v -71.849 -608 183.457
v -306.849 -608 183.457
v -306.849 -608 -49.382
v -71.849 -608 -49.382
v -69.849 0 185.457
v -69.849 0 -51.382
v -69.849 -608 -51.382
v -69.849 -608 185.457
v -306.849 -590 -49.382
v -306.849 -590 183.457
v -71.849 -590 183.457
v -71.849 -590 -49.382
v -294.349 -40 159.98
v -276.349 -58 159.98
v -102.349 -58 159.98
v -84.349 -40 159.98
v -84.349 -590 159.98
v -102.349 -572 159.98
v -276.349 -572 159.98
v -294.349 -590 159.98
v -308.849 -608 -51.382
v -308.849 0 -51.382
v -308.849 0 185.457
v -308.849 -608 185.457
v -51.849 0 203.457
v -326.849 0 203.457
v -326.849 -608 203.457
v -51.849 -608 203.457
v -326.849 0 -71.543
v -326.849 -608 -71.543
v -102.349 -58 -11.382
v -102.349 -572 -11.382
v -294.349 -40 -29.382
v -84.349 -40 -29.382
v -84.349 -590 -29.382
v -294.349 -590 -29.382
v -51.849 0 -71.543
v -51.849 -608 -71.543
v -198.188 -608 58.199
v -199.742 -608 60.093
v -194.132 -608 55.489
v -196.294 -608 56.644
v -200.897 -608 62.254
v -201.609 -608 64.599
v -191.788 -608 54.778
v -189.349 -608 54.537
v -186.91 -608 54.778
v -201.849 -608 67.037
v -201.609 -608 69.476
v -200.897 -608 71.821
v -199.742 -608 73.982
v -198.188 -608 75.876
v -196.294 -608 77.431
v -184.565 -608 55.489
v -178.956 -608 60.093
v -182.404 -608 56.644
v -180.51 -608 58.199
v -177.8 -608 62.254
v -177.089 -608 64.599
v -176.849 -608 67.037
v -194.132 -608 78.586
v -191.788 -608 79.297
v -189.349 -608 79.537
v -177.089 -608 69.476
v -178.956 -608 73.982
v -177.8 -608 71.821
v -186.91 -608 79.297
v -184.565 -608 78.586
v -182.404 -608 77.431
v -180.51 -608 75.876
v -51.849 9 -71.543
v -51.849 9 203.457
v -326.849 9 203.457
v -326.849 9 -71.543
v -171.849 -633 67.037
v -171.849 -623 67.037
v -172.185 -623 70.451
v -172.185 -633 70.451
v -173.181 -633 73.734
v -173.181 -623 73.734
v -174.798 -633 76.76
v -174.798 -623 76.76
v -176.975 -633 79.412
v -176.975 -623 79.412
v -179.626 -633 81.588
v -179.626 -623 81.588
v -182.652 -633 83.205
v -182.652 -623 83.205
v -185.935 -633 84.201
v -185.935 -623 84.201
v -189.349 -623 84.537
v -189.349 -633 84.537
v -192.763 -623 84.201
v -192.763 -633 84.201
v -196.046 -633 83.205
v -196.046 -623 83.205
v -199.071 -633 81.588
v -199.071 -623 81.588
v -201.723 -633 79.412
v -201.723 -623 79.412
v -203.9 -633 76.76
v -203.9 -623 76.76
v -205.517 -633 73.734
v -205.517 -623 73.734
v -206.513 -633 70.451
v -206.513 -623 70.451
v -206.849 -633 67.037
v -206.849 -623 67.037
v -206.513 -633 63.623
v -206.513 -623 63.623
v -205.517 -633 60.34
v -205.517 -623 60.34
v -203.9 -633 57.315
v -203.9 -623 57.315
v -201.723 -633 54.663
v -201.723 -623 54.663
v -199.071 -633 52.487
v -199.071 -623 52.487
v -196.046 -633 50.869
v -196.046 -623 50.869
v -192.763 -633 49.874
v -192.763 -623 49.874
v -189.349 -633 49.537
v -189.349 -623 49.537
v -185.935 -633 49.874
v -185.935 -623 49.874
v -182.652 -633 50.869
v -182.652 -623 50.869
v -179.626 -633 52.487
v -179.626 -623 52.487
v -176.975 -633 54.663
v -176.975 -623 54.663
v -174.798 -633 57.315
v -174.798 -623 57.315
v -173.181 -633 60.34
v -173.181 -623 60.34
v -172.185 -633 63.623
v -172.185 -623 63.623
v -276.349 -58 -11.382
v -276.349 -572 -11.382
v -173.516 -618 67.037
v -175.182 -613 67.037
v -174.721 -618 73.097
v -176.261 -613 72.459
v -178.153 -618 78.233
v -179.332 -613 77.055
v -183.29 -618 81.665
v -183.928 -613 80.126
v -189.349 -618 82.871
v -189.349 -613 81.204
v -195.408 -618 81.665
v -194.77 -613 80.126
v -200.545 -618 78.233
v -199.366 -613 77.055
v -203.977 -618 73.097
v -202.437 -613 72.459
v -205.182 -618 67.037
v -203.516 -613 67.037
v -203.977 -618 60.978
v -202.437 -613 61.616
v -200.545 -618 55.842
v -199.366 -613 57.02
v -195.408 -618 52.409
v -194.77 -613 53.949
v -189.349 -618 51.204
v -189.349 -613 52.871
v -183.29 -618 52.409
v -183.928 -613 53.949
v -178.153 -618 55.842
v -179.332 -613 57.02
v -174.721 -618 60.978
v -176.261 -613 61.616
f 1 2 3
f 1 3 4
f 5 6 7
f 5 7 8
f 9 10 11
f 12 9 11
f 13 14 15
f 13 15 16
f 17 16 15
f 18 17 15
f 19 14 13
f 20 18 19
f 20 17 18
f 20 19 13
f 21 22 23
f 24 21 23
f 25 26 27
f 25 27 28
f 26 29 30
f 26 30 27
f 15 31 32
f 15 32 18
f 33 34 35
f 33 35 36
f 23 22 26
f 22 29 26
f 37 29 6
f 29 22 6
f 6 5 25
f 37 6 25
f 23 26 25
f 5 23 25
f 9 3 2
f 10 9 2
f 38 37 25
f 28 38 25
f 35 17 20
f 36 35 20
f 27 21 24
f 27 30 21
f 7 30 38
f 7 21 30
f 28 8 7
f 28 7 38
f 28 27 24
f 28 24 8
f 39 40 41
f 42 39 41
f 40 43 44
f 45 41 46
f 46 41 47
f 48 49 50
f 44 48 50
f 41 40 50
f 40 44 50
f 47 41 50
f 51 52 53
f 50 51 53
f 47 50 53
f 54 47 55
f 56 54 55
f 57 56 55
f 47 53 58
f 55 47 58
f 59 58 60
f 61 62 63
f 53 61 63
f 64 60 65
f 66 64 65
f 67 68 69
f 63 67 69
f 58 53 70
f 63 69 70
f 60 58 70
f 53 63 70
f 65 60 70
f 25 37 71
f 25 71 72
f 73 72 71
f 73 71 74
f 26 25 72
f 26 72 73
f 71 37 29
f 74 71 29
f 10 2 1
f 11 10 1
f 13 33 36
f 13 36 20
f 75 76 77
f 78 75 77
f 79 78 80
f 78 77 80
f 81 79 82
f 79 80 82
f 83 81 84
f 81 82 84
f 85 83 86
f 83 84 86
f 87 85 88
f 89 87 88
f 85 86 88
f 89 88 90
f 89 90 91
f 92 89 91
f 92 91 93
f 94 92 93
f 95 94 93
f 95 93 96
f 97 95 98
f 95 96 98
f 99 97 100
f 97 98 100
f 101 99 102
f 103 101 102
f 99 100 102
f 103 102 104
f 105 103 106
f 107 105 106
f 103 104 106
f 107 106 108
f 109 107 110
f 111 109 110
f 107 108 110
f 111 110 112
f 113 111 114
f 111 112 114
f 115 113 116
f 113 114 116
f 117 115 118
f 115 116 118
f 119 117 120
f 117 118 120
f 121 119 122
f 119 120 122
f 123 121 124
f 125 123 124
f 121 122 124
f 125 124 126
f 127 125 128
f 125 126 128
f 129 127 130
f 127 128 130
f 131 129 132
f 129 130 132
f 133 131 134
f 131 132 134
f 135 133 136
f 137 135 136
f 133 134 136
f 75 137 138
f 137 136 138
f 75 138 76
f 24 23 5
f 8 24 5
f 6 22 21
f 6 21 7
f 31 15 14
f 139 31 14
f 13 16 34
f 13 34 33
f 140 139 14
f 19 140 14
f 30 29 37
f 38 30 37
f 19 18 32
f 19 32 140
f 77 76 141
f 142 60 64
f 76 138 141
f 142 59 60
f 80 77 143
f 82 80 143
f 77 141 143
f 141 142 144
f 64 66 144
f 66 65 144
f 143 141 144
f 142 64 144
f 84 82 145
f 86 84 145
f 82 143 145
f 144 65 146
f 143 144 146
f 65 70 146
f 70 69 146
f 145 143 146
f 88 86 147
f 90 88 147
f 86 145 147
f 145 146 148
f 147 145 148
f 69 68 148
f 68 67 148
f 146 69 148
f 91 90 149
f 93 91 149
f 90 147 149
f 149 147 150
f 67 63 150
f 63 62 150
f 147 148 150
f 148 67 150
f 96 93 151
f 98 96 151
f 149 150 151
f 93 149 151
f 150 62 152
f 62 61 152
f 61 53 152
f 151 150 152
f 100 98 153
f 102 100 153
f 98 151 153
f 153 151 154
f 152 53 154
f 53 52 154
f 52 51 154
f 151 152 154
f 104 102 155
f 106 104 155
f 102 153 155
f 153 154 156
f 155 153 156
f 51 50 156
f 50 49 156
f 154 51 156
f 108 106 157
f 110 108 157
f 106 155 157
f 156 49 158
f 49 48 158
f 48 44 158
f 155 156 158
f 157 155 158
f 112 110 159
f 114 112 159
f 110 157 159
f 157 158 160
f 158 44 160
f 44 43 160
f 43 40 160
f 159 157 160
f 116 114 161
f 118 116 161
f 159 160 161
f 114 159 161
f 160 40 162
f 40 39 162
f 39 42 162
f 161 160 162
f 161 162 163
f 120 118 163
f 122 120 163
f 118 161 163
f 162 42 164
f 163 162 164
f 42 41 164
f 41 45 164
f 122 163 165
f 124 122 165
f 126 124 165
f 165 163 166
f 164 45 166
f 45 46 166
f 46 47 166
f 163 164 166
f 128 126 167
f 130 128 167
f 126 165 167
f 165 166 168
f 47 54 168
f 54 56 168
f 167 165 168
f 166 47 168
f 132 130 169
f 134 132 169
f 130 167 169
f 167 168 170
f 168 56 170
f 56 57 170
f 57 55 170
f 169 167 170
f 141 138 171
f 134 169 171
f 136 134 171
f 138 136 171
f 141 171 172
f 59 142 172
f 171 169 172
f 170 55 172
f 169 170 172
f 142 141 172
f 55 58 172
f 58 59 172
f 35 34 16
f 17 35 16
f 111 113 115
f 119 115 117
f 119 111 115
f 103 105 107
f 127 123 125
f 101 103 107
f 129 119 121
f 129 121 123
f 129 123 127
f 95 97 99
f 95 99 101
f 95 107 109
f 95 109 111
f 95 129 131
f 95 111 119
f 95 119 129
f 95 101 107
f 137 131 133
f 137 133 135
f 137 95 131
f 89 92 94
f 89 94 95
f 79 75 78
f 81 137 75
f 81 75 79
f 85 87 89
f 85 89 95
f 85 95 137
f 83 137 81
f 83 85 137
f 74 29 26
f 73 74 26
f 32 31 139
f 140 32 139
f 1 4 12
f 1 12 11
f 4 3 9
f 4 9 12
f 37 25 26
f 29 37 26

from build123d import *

# Parameters (mm, degrees)
F0_W      = 275
F0_H      = 275
F0_W_2    = 239
F0_H_2    = 236.838547
F1_DEPTH  = 608
F2_W      = 275
F2_H      = 275
F3_DEPTH  = 9
F4_W      = 235
F4_H      = 232.838547
F5_DEPTH  = 18
F6_W      = 210
F6_H      = 189.362255
F7_DEPTH  = 550
F8_T      = -18
F9_R      = 17.5
F10_DEPTH = 25
F11_SIZE2 = 5
F11_SIZE  = 15


with BuildPart() as f1:
    # F0 (on Front) → F1 (new body)
    with BuildSketch(Plane.XZ):
        with Locations((-189.348952, 65.956648)):
            Rectangle(F0_W, F0_H)
        with Locations((-189.348952, 67.037374)):
            Rectangle(F0_W_2, F0_H_2, mode=Mode.SUBTRACT)
    extrude(amount=F1_DEPTH)


with BuildPart() as f3:
    # F2 (on face) → F3 (new body)
    with BuildSketch(Plane(origin=(0, 0, 0), x_dir=(-1, 0, 0), z_dir=(0, 1, 0))):
        with Locations((189.348952, 65.956648)):
            Rectangle(F2_W, F2_H)
    extrude(amount=F3_DEPTH)


with BuildPart() as f5:
    # F4 (on face) → F5 (new body)
    with BuildSketch(Plane.XZ.offset(608)):
        with Locations((-189.348952, 67.037374)):
            Rectangle(F4_W, F4_H)
    extrude(amount=-F5_DEPTH)


with BuildPart() as f7:
    # F6 (on face) → F7 (new body)
    with BuildSketch(Plane(origin=(0, -590, 0), x_dir=(-1, 0, 0), z_dir=(0, 1, 0))):
        with Locations((189.348952, 65.299228)):
            Rectangle(F6_W, F6_H)
    extrude(amount=F7_DEPTH)

    # F8
    f8_openings = [f7.faces().sort_by_distance(p)[0] for p in [
        (-189.348952, -315, 159.980356),
    ]]
    offset(amount=F8_T, openings=f8_openings)


with BuildPart() as f10:
    # F9 (on face) → F10 (new body)
    with BuildSketch(Plane.XZ.offset(608)):
        with Locations((-189.348952, 67.037374)):
            Circle(F9_R)
    extrude(amount=F10_DEPTH)

    # F11
    f11_edges = [f10.edges().sort_by_distance(p)[0] for p in [
        (-206.848952, -608, 67.037374),
    ]]
    chamfer(f11_edges, length=F11_SIZE, length2=F11_SIZE2)


solid = Compound([f1.part, f3.part, f5.part, f7.part, f10.part])
